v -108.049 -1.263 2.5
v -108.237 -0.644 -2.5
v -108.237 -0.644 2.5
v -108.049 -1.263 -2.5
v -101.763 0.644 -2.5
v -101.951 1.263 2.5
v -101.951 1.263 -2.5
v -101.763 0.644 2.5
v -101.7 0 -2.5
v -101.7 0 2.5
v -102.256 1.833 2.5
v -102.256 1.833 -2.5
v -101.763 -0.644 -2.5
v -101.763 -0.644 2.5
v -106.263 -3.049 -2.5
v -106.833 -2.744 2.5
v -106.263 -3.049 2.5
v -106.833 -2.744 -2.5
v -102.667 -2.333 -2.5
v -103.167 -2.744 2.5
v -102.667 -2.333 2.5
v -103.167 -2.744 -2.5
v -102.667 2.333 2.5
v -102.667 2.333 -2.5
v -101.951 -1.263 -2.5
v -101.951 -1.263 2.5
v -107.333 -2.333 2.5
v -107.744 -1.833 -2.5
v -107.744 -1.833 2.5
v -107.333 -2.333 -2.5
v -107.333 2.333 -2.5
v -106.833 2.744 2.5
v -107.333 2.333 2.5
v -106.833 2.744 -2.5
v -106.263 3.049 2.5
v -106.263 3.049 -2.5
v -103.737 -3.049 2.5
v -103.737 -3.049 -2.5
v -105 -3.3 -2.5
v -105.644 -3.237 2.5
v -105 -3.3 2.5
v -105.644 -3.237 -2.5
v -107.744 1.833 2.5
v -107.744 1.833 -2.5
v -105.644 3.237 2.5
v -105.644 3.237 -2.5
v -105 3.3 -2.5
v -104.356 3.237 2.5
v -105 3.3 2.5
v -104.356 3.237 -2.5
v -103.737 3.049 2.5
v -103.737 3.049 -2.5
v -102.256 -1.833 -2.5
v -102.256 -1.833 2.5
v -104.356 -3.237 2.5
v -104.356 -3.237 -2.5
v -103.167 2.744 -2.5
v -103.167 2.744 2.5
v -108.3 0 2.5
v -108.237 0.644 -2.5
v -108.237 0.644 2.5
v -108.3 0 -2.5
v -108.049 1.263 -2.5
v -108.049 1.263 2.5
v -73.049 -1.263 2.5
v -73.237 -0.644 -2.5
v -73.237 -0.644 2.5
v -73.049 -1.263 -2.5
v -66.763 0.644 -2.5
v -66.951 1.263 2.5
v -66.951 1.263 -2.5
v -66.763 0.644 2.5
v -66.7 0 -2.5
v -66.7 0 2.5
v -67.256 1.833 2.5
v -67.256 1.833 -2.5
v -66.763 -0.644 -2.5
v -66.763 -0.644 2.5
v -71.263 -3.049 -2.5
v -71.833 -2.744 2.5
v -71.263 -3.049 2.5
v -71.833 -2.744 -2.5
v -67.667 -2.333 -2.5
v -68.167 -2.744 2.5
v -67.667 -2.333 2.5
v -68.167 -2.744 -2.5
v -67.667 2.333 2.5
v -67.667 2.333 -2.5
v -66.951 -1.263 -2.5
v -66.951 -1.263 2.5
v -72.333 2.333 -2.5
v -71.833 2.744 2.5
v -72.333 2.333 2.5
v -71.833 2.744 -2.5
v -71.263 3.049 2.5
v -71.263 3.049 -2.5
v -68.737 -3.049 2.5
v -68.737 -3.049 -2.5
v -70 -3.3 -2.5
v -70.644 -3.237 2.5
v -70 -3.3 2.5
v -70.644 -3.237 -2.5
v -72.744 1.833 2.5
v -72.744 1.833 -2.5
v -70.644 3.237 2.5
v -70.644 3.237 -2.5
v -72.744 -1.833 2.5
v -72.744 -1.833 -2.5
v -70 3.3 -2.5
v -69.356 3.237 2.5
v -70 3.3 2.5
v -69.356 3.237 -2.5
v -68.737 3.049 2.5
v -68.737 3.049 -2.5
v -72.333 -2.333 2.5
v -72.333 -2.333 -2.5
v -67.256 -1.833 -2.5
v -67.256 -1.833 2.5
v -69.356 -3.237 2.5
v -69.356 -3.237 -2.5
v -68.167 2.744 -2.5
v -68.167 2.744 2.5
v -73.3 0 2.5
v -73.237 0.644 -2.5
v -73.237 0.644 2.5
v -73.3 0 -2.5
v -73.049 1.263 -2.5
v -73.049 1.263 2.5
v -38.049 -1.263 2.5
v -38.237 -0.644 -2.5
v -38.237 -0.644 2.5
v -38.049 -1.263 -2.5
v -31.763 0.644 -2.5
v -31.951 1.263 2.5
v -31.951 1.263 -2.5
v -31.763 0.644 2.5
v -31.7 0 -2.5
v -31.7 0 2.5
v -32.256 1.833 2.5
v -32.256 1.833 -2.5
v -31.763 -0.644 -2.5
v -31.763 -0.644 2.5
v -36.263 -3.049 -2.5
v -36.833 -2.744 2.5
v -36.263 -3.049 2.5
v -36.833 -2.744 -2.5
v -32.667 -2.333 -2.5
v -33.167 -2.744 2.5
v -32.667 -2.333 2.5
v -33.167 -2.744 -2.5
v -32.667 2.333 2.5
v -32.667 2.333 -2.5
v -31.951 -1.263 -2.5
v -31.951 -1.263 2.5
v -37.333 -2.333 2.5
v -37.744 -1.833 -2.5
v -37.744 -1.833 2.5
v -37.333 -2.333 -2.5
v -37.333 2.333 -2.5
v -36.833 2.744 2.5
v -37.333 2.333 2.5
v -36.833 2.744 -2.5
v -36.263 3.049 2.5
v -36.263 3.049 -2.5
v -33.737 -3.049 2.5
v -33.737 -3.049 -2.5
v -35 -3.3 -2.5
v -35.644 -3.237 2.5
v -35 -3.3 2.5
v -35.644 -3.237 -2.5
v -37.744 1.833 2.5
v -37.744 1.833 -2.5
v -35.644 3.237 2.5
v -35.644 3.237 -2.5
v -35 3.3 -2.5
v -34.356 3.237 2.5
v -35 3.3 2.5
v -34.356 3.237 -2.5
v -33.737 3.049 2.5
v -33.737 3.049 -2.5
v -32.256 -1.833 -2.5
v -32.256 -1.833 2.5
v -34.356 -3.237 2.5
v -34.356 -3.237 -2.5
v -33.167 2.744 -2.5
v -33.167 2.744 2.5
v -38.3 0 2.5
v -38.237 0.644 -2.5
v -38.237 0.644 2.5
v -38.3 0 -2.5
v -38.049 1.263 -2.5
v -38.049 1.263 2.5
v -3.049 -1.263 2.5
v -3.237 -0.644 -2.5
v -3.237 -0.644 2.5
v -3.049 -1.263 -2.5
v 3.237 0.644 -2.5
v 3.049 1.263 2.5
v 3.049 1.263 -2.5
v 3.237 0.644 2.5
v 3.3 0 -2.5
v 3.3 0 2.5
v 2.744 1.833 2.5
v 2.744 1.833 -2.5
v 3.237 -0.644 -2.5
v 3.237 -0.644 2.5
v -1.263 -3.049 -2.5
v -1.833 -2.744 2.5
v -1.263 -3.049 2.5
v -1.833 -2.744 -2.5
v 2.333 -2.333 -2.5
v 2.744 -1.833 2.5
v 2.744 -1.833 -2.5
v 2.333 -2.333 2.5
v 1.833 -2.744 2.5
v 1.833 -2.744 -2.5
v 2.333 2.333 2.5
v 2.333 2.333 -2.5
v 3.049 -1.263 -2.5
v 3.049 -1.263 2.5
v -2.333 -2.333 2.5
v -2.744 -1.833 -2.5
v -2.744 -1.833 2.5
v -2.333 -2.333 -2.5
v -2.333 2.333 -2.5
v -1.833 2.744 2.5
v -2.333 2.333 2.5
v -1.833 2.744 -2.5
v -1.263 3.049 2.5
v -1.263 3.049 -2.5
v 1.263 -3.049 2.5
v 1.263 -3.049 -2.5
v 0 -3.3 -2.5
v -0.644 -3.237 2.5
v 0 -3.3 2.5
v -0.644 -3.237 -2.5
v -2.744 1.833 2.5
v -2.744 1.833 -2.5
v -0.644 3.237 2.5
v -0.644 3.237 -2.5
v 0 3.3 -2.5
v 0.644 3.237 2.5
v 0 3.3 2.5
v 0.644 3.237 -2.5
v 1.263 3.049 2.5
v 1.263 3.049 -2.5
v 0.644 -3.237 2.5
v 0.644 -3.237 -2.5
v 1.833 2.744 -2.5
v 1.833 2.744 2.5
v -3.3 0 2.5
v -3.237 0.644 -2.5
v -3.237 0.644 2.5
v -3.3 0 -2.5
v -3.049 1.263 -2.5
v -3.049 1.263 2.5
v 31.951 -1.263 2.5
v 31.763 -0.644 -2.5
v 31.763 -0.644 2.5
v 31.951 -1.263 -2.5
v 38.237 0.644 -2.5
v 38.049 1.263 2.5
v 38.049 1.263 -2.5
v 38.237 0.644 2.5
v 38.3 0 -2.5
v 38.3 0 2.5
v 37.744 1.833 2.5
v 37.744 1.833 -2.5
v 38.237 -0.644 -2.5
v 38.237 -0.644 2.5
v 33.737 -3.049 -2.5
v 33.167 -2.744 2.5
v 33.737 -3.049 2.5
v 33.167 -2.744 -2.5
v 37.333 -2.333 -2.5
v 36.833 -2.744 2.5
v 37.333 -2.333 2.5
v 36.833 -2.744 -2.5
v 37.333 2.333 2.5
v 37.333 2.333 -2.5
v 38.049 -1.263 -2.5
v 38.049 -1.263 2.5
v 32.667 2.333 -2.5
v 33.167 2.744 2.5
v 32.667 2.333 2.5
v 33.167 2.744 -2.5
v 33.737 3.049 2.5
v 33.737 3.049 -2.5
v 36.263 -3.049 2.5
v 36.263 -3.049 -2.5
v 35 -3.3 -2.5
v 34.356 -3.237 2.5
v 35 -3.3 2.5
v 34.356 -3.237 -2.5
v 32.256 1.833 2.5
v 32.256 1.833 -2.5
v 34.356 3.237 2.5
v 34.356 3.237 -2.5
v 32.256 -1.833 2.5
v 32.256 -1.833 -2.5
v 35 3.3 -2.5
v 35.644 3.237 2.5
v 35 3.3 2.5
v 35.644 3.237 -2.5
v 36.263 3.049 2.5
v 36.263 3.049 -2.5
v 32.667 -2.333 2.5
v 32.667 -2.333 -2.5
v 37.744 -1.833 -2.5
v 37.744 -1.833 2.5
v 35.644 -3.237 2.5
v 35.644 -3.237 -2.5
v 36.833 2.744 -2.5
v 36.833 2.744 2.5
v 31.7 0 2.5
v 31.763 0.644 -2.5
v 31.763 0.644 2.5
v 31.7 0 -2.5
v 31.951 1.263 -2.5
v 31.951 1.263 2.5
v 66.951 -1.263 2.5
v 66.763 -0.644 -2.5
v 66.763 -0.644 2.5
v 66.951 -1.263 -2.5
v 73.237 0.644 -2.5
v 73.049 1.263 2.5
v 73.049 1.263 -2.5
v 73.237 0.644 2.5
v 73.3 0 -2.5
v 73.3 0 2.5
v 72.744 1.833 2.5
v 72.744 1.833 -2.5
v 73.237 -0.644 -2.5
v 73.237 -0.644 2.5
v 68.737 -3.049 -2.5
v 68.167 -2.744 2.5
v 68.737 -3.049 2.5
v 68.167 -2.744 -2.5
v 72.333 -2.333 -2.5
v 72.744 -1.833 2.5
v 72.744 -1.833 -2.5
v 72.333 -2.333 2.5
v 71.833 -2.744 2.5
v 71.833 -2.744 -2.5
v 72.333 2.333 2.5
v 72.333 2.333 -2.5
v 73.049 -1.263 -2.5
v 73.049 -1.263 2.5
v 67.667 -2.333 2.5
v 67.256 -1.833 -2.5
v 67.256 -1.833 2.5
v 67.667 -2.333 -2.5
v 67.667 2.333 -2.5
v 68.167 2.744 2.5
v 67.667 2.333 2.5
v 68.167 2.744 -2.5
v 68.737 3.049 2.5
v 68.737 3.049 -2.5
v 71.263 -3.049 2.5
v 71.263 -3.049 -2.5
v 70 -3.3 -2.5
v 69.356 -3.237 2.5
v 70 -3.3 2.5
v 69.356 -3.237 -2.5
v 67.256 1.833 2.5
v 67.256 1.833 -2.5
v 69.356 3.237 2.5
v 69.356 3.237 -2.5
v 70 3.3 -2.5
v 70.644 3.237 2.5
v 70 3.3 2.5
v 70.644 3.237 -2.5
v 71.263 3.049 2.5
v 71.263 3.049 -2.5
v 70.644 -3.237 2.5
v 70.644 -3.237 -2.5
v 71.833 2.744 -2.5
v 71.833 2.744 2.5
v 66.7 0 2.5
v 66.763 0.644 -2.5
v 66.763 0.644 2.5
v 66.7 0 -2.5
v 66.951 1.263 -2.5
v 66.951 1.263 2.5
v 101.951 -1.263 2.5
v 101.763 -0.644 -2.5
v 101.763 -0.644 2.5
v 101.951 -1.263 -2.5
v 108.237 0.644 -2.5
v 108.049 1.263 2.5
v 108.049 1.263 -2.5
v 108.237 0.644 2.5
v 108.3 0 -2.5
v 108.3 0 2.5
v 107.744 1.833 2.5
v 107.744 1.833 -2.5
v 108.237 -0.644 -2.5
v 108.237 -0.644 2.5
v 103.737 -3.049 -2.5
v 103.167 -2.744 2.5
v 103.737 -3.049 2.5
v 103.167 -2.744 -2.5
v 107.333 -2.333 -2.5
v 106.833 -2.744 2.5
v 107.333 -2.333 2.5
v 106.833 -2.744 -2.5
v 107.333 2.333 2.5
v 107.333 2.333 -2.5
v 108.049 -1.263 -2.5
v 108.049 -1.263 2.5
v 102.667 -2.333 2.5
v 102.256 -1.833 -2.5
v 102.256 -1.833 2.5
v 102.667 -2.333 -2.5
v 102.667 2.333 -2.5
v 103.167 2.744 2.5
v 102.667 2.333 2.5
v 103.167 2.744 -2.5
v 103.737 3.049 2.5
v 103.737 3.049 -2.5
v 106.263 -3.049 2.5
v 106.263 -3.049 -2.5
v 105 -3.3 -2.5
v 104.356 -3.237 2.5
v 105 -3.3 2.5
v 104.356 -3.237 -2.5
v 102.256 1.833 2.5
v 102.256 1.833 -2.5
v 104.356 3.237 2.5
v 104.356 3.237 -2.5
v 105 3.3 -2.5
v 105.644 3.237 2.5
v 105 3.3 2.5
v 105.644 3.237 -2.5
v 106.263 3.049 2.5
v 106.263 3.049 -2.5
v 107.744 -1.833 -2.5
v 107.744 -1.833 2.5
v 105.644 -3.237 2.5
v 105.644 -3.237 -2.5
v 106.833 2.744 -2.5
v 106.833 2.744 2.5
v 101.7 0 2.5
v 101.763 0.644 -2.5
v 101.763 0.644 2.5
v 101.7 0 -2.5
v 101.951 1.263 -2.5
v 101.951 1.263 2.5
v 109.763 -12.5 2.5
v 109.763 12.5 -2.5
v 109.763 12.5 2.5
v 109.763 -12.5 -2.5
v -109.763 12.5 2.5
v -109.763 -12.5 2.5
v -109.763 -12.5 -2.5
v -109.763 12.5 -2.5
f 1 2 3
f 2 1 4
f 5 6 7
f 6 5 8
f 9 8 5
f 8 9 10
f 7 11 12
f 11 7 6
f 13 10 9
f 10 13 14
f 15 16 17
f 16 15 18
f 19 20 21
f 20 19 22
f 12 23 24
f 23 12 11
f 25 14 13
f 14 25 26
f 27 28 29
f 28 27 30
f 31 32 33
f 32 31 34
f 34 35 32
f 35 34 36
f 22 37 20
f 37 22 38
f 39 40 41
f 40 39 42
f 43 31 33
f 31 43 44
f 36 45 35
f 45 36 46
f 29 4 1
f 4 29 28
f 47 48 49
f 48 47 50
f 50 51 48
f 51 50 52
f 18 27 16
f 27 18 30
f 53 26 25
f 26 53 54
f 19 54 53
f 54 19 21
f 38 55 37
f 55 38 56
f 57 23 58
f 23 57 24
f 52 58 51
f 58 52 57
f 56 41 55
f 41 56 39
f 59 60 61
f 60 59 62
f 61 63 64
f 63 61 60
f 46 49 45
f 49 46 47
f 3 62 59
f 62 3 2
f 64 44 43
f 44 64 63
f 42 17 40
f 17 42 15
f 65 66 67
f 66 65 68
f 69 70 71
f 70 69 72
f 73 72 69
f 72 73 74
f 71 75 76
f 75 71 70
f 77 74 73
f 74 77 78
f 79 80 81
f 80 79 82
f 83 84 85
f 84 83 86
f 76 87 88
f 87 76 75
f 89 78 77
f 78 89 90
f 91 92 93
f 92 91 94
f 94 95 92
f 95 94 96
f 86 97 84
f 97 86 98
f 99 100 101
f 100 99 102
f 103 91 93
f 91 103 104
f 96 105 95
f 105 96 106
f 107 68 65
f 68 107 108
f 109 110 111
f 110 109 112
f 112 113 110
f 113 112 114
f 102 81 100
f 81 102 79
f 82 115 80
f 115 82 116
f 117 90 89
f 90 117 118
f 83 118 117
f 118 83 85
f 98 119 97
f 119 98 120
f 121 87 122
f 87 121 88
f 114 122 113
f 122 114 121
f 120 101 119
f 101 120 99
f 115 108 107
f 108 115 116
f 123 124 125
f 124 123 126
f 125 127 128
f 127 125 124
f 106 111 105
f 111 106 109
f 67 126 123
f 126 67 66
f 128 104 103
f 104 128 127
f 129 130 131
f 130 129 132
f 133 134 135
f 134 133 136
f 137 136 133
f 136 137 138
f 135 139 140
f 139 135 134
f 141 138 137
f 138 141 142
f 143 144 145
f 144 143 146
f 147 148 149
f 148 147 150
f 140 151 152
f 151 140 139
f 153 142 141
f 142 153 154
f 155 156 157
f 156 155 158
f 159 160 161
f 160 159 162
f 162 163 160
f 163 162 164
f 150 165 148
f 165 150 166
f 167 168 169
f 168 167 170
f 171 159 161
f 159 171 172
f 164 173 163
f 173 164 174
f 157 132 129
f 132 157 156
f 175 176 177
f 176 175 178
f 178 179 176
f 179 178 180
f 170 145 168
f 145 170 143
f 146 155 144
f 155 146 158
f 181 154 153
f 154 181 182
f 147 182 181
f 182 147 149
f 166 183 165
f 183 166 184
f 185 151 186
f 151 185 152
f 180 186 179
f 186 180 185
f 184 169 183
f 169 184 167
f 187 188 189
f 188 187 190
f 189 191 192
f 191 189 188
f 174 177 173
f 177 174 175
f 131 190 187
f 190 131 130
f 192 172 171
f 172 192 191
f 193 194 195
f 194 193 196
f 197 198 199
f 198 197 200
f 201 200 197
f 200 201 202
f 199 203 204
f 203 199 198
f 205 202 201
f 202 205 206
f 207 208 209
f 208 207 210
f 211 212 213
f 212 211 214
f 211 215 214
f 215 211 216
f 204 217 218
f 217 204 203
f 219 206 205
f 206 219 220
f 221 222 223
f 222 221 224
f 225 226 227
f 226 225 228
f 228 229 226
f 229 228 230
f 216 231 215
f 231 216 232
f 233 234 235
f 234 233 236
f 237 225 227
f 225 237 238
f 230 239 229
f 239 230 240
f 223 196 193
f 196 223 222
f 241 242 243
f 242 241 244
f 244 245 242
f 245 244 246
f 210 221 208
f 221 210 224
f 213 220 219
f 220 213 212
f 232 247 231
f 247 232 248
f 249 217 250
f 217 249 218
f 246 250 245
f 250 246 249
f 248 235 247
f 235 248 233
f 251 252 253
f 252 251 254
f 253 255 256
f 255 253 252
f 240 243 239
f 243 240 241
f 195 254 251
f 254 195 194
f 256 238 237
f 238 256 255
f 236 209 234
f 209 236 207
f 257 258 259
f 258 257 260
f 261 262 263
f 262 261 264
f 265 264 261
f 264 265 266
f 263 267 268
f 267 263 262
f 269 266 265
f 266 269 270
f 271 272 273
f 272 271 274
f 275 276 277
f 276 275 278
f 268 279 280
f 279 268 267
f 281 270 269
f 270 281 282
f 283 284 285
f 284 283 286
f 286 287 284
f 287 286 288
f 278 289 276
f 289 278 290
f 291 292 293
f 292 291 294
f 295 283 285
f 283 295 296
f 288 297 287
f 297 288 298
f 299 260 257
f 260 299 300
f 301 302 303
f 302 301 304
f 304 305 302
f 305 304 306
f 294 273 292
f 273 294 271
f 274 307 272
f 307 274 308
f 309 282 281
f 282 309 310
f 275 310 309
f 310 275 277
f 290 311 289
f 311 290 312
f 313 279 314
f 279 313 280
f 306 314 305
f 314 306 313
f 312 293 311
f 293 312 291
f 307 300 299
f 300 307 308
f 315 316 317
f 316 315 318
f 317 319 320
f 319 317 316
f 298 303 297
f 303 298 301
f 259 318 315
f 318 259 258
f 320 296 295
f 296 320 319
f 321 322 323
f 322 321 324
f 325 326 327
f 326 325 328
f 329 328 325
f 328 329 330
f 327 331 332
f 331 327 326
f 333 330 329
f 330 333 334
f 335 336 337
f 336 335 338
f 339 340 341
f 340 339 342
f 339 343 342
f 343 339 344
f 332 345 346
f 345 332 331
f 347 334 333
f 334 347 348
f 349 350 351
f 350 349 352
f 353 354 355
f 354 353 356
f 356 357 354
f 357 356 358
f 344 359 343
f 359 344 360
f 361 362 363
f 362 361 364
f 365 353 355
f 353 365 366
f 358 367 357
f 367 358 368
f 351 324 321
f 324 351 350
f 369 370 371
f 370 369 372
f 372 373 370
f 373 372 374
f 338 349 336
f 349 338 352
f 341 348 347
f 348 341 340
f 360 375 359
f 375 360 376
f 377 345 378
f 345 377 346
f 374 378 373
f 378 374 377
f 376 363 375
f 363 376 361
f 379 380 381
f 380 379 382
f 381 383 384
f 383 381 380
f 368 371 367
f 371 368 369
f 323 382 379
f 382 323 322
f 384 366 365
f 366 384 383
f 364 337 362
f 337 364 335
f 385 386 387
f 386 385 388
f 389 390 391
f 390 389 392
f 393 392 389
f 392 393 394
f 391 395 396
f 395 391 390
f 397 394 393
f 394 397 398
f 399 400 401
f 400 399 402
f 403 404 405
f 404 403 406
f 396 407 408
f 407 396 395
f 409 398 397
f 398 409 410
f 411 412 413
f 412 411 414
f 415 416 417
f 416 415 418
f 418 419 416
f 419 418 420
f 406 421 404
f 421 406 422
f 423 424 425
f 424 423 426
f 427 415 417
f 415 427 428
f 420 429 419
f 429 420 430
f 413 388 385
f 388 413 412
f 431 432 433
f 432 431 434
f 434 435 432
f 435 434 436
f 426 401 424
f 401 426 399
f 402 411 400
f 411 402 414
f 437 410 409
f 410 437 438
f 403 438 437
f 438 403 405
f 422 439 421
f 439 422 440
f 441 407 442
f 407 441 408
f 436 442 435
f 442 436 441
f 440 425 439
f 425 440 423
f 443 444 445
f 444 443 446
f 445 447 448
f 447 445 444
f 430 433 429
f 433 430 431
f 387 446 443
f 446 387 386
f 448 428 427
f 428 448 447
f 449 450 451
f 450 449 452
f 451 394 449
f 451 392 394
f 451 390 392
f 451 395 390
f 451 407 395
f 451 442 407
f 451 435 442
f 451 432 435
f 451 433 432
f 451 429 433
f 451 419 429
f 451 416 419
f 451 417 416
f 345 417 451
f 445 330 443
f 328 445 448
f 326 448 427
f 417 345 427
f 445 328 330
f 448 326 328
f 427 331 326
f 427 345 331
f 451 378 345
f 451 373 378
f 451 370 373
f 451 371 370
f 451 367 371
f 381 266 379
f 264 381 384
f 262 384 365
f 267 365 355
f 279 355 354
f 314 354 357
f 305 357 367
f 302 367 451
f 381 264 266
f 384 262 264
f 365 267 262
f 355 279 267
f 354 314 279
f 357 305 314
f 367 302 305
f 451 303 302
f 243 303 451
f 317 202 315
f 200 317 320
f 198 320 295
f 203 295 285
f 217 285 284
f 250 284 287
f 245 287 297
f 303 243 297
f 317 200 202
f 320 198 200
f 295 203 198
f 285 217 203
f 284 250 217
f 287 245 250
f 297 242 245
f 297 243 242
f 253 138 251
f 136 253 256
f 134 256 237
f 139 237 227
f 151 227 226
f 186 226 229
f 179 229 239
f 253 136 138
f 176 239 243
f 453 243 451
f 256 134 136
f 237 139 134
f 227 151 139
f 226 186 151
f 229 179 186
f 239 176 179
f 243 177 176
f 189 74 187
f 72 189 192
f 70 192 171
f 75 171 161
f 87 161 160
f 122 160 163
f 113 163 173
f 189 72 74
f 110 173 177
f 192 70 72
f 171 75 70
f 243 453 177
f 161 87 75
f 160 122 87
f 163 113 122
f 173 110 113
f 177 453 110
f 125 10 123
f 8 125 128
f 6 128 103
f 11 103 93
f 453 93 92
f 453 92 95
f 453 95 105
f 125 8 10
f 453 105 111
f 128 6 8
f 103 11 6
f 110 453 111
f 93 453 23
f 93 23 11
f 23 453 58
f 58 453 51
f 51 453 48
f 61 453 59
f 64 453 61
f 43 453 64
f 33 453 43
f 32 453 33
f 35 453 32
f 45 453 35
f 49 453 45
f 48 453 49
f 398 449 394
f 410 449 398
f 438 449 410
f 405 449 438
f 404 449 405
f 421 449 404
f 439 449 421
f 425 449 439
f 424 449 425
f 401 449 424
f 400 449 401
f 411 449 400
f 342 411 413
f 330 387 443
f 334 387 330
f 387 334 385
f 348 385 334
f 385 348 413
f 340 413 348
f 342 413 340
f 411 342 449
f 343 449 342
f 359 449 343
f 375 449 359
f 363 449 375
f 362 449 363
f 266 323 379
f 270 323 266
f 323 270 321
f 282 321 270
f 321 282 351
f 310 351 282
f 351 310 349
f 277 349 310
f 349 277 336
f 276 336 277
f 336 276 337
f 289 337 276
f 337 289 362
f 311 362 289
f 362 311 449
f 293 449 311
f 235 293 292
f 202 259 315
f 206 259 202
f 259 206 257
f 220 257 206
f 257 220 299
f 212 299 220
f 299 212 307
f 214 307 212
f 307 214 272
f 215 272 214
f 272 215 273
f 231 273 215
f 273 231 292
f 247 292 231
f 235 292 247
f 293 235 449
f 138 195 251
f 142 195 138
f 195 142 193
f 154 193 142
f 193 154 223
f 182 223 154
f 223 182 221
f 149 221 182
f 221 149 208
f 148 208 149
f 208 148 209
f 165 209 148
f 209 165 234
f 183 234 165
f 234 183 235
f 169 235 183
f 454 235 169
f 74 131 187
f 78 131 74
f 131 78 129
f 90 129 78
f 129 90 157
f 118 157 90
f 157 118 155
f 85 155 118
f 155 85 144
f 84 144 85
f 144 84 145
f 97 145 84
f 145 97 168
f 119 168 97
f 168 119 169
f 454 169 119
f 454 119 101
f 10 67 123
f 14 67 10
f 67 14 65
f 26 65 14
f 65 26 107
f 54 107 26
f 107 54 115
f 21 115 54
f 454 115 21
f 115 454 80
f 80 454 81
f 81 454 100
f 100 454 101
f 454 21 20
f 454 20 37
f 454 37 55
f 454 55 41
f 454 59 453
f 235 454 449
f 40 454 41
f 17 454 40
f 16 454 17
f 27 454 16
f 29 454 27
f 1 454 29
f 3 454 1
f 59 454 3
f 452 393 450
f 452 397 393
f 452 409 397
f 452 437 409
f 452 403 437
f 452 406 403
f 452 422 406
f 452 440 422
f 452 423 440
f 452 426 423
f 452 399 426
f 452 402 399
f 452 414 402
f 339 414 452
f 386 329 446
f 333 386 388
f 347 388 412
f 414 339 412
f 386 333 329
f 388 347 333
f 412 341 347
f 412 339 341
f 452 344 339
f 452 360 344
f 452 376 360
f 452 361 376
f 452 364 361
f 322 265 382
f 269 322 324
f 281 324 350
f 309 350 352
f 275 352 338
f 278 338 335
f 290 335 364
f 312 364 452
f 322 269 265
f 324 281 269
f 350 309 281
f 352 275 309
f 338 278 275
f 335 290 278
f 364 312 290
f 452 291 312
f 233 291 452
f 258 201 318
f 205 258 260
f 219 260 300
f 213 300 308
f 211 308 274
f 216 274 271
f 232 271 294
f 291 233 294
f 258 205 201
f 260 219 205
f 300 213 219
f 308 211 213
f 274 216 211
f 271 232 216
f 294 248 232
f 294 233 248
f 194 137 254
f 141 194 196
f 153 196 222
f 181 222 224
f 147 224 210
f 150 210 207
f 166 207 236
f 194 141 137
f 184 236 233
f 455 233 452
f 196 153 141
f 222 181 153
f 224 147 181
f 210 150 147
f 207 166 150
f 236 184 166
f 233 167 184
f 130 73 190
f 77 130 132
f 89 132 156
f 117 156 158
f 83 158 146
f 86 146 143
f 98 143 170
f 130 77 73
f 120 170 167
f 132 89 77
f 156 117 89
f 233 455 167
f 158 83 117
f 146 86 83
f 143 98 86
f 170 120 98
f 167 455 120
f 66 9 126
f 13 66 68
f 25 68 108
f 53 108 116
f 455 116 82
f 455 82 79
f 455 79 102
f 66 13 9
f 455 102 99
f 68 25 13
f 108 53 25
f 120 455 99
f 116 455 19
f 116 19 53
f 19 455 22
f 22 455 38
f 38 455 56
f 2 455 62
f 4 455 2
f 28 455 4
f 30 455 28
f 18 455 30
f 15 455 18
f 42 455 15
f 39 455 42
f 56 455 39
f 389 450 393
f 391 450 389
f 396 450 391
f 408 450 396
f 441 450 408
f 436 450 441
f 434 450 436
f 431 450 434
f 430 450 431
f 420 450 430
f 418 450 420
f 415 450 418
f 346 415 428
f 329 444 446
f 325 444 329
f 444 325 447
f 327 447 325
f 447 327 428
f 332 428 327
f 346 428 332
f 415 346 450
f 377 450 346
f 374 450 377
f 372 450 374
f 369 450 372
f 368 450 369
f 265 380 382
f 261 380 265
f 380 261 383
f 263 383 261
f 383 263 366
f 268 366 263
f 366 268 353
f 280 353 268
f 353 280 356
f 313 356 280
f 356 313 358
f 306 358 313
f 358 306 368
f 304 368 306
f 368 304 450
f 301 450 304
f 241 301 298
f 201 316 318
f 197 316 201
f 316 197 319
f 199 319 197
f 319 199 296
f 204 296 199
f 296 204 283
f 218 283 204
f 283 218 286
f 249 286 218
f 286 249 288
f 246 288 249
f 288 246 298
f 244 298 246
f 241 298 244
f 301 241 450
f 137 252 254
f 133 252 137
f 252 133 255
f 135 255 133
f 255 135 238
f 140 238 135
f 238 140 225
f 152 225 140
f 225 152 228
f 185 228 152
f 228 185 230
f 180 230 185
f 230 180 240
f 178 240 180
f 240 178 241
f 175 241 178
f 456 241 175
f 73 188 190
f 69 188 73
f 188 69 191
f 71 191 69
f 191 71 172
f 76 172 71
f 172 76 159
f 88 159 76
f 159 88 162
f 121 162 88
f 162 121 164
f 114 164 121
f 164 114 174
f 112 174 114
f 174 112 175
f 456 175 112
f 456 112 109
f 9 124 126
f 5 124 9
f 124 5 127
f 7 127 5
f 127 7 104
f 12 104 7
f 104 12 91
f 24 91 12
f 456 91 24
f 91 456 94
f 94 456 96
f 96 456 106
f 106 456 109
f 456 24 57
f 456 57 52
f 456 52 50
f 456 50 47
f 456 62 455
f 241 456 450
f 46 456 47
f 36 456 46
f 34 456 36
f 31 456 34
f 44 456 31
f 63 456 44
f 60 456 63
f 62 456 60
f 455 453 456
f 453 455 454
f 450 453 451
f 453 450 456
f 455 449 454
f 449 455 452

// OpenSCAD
$fn = 32;

// ----------------------------------------------------------------------
// Hole bar, 7 x Ø6.6
// skip layout, 4.7625 mm edge offset
// ----------------------------------------------------------------------

// --- parameters (mm) ---
bar_w = 25;         // bar width (Y)
bar_t = 5;          // bar thickness (Z)
holes = 7;          // holes per row
hole_d = 6.6;       // hole diameter
edge = 4.763;       // offset from the bar end to the first hole
grid_pitch = 17.5;  // grid the bar was laid out on

// --- derived feature positions (mm) ---
pitch = grid_pitch * 2;       // = 35   holes sit every other grid slot
span = (holes - 1) * pitch;   // = 210   distance between the end holes
bar_l = span + 2 * edge;      // = 219.53   overall bar length
start_x = -bar_l / 2 + edge;  // = -105   X of the first hole
feature_centers = [
  [start_x + 0 * pitch, 0],
  [start_x + 1 * pitch, 0],
  [start_x + 2 * pitch, 0],
  [start_x + 3 * pitch, 0],
  [start_x + 4 * pitch, 0],
  [start_x + 5 * pitch, 0],
  [start_x + 6 * pitch, 0]
];   // hole centres of the first row

// bar with one row of holes, drilled from feature_centers
difference() {
  translate([-bar_l / 2, -bar_w / 2, -bar_t / 2]) cube([bar_l, bar_w, bar_t]);
  for (centre = feature_centers)
    translate([centre[0], centre[1], 0])
      cylinder(d = hole_d, h = bar_t + 2, center = true);
}
